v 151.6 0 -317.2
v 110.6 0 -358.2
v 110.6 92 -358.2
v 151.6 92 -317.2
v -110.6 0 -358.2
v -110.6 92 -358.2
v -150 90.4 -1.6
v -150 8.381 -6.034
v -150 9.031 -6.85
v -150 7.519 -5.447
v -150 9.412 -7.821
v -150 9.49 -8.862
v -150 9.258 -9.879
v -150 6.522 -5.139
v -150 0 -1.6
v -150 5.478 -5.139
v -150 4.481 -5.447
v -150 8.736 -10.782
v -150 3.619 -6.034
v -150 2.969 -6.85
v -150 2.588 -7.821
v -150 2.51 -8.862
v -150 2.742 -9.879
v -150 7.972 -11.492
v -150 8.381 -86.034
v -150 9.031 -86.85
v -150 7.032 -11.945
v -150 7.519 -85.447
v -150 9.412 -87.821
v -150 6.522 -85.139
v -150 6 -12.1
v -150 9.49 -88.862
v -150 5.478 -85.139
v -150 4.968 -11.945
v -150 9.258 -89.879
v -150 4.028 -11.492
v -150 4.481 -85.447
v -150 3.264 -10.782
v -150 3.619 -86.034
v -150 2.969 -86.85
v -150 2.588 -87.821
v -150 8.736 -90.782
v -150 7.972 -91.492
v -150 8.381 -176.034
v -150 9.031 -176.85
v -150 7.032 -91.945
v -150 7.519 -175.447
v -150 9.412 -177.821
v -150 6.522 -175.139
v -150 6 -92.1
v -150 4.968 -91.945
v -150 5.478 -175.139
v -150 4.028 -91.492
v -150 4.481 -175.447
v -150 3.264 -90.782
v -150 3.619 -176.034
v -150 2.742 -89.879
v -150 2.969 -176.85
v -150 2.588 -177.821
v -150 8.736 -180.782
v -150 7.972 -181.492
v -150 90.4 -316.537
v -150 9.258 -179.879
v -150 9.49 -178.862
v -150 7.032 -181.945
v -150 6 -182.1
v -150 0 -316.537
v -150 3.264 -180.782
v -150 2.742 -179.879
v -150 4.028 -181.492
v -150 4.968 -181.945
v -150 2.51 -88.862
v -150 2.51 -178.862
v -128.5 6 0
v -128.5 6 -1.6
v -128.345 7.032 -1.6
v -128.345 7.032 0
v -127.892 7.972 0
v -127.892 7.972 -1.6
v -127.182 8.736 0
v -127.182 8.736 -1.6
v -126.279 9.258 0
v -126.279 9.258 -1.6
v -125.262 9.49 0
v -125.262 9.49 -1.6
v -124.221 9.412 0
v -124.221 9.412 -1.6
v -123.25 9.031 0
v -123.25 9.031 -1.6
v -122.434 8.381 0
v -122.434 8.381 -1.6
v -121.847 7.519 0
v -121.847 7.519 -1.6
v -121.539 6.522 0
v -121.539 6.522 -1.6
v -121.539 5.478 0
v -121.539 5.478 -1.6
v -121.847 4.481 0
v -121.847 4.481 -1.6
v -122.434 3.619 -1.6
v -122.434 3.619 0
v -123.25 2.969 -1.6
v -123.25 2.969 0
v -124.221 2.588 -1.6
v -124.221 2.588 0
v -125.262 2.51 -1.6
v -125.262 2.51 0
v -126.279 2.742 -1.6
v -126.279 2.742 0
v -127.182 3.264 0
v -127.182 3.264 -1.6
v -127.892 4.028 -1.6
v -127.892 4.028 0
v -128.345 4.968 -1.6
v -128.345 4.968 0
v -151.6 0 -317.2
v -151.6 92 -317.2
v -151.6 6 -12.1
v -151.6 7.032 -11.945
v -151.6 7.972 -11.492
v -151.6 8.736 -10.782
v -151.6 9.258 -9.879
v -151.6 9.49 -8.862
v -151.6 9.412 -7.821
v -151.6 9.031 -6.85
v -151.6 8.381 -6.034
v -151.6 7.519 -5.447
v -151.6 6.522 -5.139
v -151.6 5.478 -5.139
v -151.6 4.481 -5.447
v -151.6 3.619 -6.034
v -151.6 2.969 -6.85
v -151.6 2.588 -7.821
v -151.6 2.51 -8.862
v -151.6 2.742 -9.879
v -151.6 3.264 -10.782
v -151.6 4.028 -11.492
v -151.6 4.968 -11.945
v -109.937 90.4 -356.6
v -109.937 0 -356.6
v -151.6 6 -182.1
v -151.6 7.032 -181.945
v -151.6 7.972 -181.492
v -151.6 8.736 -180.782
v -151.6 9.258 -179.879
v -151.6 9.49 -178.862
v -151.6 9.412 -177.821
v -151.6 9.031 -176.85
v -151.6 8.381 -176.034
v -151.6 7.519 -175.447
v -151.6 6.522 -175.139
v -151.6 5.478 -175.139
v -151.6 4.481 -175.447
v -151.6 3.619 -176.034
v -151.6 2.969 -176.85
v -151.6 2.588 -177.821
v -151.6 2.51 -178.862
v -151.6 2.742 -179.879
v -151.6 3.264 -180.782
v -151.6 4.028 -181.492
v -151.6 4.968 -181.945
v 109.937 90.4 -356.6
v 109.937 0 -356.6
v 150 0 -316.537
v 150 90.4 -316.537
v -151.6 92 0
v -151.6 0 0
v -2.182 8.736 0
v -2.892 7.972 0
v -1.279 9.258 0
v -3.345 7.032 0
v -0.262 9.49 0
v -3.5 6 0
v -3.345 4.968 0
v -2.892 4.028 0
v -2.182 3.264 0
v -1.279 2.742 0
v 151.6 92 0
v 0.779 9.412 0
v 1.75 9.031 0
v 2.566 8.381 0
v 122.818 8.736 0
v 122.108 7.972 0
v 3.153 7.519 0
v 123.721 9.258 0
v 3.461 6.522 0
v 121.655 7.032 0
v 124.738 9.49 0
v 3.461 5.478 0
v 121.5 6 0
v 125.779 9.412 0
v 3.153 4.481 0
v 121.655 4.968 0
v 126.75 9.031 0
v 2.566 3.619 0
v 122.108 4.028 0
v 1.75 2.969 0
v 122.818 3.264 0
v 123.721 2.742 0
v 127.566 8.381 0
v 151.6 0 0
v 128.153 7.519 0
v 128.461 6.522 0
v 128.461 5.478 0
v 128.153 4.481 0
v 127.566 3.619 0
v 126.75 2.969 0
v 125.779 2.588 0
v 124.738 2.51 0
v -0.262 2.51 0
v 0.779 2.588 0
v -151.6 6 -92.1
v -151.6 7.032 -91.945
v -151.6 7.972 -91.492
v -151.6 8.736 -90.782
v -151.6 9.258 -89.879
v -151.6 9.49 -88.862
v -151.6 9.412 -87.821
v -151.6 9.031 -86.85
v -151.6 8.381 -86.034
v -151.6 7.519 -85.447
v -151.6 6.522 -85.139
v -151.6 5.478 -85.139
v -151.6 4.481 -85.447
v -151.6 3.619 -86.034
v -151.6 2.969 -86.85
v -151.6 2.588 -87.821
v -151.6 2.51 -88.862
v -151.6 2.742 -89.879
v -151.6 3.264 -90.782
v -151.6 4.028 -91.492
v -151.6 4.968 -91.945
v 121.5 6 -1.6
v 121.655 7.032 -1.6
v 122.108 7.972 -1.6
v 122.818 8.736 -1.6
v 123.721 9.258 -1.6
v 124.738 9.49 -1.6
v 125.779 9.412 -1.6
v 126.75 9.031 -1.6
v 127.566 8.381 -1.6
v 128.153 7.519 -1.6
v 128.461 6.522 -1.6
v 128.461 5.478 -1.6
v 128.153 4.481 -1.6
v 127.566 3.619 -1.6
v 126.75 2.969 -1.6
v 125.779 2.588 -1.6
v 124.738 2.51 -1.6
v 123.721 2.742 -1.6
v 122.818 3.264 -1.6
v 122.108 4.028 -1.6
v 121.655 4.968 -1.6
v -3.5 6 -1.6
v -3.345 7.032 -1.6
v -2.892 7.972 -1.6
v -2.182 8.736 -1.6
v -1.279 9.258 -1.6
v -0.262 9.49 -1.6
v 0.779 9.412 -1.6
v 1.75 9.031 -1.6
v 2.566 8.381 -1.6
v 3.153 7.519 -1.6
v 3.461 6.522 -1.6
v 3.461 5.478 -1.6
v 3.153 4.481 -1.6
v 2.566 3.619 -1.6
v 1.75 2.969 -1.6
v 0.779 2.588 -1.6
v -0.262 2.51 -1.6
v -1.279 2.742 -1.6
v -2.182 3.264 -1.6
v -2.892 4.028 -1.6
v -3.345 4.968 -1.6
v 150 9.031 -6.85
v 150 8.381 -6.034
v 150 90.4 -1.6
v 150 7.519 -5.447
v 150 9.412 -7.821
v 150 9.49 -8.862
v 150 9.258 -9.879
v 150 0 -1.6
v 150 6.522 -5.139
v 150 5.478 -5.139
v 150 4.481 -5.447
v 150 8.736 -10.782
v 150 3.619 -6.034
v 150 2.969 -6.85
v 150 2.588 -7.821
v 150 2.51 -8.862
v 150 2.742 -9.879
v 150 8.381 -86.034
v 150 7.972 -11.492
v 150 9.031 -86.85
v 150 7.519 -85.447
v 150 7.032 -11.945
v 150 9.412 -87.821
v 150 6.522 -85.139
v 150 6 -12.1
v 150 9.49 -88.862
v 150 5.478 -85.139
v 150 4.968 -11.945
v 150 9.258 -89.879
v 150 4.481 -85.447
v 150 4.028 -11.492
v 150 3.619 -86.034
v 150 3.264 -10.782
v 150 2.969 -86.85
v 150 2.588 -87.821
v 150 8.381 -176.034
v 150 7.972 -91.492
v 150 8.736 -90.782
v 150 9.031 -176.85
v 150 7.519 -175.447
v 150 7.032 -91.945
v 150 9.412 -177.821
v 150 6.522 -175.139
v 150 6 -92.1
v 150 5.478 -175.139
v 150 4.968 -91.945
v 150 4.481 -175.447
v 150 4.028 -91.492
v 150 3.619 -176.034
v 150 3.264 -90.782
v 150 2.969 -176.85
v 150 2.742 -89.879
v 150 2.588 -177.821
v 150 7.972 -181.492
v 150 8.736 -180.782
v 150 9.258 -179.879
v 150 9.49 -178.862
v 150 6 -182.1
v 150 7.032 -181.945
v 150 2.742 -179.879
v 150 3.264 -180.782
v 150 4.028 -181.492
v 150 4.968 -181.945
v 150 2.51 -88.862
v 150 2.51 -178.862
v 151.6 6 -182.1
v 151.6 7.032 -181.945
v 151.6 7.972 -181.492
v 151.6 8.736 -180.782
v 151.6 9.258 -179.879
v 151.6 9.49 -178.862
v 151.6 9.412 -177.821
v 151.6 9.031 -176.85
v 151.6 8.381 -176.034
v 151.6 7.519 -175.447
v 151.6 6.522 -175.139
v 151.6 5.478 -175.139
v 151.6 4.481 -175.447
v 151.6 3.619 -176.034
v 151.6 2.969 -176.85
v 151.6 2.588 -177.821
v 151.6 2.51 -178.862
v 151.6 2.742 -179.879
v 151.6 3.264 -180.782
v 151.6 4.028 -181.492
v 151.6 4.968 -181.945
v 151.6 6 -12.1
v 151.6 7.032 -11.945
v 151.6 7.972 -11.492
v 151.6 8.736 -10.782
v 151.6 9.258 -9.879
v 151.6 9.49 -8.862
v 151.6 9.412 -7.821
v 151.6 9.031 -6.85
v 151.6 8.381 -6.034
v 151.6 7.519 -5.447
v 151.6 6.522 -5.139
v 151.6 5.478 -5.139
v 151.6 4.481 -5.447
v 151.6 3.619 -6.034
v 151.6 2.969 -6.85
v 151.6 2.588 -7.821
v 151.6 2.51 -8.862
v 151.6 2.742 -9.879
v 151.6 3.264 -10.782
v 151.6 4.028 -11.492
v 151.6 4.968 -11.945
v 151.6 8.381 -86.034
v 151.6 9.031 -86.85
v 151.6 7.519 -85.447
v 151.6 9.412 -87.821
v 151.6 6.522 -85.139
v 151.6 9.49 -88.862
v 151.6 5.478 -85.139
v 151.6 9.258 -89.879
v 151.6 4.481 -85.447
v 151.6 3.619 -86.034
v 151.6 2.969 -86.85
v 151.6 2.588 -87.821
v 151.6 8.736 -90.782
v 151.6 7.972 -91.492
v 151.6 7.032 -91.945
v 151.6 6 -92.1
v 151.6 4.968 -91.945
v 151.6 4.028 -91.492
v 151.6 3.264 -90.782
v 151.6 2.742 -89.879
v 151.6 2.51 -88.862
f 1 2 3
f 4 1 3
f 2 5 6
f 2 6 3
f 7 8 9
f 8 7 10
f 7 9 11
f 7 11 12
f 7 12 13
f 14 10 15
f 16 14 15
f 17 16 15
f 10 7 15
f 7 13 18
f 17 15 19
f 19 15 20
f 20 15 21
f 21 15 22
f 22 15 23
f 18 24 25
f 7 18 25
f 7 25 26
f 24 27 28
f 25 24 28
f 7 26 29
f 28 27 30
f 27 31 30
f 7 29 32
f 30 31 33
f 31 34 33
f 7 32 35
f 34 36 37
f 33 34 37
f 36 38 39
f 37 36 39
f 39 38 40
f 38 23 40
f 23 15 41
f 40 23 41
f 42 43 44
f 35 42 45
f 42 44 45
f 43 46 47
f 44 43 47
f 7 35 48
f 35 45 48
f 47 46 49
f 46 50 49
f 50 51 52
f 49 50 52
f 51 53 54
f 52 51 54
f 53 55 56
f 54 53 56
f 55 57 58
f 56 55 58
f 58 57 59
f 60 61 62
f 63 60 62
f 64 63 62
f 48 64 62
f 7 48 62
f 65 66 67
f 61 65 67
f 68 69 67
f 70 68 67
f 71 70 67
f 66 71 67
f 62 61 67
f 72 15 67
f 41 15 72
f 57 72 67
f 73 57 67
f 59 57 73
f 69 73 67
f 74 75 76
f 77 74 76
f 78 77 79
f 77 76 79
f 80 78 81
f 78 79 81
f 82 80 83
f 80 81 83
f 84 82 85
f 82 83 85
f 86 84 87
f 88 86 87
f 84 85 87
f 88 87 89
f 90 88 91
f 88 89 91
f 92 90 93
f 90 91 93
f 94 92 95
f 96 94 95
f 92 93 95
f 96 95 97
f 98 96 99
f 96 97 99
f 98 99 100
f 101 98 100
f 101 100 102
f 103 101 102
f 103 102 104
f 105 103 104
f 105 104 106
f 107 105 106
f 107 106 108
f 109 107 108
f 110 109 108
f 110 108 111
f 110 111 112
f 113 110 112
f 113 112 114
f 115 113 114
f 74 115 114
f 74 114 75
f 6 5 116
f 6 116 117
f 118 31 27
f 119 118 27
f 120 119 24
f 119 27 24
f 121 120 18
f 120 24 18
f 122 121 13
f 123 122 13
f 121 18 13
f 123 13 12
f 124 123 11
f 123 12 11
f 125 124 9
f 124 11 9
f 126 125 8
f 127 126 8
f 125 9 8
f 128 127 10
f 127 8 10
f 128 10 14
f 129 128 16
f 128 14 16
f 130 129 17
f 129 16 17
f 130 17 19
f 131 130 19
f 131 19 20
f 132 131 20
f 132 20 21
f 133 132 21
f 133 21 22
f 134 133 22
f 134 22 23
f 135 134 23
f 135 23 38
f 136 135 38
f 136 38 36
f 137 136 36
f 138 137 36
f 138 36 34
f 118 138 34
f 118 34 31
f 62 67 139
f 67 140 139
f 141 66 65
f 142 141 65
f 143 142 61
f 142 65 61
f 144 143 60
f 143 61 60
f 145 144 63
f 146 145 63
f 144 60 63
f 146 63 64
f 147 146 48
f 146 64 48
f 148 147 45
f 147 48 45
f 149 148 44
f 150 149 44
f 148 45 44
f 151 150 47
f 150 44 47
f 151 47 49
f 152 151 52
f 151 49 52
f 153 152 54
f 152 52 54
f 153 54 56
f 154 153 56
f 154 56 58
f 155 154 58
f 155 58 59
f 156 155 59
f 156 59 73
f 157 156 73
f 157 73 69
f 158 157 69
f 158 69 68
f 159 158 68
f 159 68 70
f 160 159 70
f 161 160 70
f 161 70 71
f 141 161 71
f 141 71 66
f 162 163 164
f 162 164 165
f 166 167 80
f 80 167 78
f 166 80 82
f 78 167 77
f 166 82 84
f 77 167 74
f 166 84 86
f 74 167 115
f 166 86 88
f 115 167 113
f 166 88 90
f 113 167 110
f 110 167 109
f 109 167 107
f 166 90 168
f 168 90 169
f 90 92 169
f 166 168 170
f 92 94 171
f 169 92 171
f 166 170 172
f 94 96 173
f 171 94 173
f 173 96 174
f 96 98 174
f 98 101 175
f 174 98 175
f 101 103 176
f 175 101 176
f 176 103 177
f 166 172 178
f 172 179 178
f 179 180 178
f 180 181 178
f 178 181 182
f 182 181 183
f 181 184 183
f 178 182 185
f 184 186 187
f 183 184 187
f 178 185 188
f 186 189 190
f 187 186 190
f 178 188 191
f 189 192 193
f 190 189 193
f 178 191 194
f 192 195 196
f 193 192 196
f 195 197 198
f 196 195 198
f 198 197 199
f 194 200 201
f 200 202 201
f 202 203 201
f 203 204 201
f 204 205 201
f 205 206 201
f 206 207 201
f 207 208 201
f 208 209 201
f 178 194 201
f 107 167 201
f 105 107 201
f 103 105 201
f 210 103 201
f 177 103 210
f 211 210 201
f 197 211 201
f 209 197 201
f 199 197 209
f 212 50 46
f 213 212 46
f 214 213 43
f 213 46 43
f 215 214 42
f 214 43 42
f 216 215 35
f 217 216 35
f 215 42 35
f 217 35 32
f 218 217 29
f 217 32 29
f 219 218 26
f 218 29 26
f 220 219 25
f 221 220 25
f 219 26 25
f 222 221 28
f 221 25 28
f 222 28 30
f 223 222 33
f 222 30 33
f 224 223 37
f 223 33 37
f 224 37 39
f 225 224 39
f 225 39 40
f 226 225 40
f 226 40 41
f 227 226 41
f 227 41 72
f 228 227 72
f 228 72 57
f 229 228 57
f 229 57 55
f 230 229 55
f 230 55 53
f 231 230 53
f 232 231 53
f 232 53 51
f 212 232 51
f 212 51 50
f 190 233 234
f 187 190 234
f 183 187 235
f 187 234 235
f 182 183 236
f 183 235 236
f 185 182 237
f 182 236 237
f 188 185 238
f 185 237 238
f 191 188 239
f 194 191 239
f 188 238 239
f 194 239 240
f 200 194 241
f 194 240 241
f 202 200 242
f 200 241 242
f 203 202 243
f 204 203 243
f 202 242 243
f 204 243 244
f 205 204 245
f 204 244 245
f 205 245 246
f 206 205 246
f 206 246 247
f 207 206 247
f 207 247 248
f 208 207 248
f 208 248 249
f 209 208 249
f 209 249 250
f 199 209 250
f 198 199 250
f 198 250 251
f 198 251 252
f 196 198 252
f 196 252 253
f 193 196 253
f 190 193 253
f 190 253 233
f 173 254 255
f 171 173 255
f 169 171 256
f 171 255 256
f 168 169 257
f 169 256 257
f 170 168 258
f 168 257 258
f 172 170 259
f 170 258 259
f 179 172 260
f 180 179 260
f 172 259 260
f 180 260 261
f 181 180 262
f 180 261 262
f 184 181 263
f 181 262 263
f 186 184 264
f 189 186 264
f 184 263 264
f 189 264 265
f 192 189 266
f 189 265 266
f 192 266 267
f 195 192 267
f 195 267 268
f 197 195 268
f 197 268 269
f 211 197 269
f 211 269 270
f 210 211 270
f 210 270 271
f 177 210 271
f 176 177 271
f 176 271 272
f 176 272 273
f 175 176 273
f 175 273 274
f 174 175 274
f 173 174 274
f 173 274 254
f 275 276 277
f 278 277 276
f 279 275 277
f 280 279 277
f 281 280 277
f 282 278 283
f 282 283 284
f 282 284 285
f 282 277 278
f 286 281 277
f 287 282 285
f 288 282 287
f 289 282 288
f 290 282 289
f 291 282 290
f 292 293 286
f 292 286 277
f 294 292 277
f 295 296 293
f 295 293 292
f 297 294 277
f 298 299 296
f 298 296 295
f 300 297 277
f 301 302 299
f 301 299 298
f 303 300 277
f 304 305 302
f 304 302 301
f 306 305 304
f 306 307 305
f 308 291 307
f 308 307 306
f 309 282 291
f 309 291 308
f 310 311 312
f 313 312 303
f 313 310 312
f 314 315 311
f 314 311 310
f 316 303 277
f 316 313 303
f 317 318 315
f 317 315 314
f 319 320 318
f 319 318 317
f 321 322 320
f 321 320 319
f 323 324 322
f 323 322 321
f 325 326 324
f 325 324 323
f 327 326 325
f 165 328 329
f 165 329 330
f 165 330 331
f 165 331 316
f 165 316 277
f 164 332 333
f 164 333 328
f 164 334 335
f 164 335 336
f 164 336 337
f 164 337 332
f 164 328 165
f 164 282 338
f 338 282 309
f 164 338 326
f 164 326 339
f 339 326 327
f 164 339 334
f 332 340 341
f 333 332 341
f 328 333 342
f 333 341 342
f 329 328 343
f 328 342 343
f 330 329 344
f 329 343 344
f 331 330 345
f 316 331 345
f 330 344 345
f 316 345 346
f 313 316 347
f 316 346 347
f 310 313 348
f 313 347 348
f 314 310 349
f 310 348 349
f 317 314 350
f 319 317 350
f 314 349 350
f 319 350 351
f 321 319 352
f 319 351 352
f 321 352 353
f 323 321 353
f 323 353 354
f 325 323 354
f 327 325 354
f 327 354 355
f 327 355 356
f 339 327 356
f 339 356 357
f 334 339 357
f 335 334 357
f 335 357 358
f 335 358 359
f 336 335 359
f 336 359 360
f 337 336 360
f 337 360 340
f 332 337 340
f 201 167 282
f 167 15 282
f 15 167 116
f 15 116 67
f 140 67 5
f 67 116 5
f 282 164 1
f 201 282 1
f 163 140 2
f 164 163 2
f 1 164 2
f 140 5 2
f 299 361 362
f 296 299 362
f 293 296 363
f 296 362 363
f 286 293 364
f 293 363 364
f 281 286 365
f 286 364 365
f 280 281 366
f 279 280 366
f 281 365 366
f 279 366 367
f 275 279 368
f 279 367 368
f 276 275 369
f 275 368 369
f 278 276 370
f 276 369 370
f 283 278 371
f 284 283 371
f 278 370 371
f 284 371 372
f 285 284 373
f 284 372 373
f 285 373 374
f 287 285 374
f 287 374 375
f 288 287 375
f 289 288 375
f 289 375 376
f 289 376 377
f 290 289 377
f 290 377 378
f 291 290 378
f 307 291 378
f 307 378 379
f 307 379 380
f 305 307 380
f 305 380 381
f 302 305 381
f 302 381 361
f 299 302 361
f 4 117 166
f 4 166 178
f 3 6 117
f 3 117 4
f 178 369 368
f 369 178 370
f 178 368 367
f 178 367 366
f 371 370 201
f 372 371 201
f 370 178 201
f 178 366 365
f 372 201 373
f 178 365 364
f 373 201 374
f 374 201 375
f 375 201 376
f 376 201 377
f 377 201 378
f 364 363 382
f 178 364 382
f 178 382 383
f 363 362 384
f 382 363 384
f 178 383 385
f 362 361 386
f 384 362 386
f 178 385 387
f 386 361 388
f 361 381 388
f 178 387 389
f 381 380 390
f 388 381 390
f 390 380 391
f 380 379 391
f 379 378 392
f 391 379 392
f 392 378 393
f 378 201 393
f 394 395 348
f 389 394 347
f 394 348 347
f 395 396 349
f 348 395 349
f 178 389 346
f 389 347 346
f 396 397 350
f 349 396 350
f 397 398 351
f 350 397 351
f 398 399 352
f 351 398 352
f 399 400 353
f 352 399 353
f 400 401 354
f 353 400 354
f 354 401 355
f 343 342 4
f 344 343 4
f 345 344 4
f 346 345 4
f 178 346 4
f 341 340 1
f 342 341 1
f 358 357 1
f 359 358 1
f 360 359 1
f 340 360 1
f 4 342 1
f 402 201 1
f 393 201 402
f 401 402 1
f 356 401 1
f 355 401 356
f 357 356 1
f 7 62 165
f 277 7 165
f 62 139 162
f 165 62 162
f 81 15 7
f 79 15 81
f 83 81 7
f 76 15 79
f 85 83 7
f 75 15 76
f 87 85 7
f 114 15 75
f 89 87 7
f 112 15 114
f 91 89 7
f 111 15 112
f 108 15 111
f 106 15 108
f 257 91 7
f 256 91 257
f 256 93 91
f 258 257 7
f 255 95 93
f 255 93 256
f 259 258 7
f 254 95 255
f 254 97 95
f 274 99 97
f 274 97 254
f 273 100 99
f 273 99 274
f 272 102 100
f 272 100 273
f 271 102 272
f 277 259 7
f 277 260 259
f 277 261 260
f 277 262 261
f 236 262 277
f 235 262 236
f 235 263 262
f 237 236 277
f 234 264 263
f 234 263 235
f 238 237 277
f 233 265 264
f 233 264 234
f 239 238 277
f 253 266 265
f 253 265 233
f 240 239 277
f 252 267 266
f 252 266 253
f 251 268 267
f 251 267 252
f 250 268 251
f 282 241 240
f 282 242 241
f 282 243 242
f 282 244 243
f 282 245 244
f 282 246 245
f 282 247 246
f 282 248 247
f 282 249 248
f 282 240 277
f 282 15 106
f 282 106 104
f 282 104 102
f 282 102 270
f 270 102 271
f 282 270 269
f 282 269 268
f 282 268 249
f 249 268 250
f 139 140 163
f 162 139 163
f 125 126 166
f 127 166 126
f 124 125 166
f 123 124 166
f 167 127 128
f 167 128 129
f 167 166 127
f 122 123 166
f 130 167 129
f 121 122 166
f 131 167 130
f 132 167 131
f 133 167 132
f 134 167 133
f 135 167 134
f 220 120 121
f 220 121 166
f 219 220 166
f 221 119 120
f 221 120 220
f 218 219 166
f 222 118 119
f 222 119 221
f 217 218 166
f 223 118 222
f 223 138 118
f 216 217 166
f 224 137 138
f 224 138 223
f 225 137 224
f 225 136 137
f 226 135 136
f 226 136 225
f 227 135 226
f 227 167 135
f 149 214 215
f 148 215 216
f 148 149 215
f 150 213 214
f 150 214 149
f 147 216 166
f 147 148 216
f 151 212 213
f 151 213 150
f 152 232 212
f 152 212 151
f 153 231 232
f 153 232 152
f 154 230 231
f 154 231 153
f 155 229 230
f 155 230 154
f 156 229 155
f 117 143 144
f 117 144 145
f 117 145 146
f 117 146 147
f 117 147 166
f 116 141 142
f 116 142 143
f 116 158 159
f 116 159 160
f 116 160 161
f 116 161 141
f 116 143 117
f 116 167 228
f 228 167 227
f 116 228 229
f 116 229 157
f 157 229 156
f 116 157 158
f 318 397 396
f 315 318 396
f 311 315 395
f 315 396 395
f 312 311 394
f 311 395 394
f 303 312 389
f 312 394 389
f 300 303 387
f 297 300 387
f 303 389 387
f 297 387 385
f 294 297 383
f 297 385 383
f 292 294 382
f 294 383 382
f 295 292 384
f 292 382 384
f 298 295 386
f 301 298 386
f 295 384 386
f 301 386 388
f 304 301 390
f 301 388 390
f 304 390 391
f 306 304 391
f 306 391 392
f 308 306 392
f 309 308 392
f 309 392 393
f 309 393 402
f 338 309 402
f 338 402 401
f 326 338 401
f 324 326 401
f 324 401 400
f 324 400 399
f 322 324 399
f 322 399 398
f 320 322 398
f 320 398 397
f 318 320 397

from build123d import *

# Parameters (mm, degrees)
SKETCH1_W                    = 303.2
SKETCH1_H                    = 358.2
BOSS_EXTRUDE1_DEPTH          = 92
CHAMFER1_SIZE                = 41
SHELL1_T                     = -1.6
F_7_0_7_DIAMETER_HOLE1_D     = 7
F_7_0_7_DIAMETER_HOLE1_DEPTH = 1.6
F_7_0_7_DIAMETER_HOLE2_D     = 7


with BuildPart() as part:
    # Sketch1 → Boss-Extrude1 (new body)
    with BuildSketch(Plane(origin=(0, 0, 0), x_dir=(1, 0, 0), z_dir=(0, 1, 0))):
        with Locations((0, 179.1)):
            Rectangle(SKETCH1_W, SKETCH1_H)
    extrude(amount=BOSS_EXTRUDE1_DEPTH)

    # Chamfer1
    chamfer1_edges = [part.edges().sort_by_distance(p)[0] for p in [
        (-151.6, 46, -358.2),
        (151.6, 46, -358.2),
    ]]
    chamfer(chamfer1_edges, length=CHAMFER1_SIZE)

    # Shell1
    shell1_openings = [part.faces().sort_by_distance(p)[0] for p in [
        (0, 0, -176.499178778),
    ]]
    offset(amount=SHELL1_T, openings=shell1_openings, kind=Kind.INTERSECTION)

    # Ø7.0 (7) Diameter Hole1
    with Locations(Plane.XY):
        with Locations((-125, 6), (0, 6), (125, 6)):
            Hole(F_7_0_7_DIAMETER_HOLE1_D / 2, depth=F_7_0_7_DIAMETER_HOLE1_DEPTH)

    # Ø7.0 (7) Diameter Hole2 (through all)
    with Locations(Plane.ZY.offset(151.6)):
        with Locations((-8.6, 6), (-88.6, 6), (-178.6, 6)):
            Hole(F_7_0_7_DIAMETER_HOLE2_D / 2)


solid = part.part
